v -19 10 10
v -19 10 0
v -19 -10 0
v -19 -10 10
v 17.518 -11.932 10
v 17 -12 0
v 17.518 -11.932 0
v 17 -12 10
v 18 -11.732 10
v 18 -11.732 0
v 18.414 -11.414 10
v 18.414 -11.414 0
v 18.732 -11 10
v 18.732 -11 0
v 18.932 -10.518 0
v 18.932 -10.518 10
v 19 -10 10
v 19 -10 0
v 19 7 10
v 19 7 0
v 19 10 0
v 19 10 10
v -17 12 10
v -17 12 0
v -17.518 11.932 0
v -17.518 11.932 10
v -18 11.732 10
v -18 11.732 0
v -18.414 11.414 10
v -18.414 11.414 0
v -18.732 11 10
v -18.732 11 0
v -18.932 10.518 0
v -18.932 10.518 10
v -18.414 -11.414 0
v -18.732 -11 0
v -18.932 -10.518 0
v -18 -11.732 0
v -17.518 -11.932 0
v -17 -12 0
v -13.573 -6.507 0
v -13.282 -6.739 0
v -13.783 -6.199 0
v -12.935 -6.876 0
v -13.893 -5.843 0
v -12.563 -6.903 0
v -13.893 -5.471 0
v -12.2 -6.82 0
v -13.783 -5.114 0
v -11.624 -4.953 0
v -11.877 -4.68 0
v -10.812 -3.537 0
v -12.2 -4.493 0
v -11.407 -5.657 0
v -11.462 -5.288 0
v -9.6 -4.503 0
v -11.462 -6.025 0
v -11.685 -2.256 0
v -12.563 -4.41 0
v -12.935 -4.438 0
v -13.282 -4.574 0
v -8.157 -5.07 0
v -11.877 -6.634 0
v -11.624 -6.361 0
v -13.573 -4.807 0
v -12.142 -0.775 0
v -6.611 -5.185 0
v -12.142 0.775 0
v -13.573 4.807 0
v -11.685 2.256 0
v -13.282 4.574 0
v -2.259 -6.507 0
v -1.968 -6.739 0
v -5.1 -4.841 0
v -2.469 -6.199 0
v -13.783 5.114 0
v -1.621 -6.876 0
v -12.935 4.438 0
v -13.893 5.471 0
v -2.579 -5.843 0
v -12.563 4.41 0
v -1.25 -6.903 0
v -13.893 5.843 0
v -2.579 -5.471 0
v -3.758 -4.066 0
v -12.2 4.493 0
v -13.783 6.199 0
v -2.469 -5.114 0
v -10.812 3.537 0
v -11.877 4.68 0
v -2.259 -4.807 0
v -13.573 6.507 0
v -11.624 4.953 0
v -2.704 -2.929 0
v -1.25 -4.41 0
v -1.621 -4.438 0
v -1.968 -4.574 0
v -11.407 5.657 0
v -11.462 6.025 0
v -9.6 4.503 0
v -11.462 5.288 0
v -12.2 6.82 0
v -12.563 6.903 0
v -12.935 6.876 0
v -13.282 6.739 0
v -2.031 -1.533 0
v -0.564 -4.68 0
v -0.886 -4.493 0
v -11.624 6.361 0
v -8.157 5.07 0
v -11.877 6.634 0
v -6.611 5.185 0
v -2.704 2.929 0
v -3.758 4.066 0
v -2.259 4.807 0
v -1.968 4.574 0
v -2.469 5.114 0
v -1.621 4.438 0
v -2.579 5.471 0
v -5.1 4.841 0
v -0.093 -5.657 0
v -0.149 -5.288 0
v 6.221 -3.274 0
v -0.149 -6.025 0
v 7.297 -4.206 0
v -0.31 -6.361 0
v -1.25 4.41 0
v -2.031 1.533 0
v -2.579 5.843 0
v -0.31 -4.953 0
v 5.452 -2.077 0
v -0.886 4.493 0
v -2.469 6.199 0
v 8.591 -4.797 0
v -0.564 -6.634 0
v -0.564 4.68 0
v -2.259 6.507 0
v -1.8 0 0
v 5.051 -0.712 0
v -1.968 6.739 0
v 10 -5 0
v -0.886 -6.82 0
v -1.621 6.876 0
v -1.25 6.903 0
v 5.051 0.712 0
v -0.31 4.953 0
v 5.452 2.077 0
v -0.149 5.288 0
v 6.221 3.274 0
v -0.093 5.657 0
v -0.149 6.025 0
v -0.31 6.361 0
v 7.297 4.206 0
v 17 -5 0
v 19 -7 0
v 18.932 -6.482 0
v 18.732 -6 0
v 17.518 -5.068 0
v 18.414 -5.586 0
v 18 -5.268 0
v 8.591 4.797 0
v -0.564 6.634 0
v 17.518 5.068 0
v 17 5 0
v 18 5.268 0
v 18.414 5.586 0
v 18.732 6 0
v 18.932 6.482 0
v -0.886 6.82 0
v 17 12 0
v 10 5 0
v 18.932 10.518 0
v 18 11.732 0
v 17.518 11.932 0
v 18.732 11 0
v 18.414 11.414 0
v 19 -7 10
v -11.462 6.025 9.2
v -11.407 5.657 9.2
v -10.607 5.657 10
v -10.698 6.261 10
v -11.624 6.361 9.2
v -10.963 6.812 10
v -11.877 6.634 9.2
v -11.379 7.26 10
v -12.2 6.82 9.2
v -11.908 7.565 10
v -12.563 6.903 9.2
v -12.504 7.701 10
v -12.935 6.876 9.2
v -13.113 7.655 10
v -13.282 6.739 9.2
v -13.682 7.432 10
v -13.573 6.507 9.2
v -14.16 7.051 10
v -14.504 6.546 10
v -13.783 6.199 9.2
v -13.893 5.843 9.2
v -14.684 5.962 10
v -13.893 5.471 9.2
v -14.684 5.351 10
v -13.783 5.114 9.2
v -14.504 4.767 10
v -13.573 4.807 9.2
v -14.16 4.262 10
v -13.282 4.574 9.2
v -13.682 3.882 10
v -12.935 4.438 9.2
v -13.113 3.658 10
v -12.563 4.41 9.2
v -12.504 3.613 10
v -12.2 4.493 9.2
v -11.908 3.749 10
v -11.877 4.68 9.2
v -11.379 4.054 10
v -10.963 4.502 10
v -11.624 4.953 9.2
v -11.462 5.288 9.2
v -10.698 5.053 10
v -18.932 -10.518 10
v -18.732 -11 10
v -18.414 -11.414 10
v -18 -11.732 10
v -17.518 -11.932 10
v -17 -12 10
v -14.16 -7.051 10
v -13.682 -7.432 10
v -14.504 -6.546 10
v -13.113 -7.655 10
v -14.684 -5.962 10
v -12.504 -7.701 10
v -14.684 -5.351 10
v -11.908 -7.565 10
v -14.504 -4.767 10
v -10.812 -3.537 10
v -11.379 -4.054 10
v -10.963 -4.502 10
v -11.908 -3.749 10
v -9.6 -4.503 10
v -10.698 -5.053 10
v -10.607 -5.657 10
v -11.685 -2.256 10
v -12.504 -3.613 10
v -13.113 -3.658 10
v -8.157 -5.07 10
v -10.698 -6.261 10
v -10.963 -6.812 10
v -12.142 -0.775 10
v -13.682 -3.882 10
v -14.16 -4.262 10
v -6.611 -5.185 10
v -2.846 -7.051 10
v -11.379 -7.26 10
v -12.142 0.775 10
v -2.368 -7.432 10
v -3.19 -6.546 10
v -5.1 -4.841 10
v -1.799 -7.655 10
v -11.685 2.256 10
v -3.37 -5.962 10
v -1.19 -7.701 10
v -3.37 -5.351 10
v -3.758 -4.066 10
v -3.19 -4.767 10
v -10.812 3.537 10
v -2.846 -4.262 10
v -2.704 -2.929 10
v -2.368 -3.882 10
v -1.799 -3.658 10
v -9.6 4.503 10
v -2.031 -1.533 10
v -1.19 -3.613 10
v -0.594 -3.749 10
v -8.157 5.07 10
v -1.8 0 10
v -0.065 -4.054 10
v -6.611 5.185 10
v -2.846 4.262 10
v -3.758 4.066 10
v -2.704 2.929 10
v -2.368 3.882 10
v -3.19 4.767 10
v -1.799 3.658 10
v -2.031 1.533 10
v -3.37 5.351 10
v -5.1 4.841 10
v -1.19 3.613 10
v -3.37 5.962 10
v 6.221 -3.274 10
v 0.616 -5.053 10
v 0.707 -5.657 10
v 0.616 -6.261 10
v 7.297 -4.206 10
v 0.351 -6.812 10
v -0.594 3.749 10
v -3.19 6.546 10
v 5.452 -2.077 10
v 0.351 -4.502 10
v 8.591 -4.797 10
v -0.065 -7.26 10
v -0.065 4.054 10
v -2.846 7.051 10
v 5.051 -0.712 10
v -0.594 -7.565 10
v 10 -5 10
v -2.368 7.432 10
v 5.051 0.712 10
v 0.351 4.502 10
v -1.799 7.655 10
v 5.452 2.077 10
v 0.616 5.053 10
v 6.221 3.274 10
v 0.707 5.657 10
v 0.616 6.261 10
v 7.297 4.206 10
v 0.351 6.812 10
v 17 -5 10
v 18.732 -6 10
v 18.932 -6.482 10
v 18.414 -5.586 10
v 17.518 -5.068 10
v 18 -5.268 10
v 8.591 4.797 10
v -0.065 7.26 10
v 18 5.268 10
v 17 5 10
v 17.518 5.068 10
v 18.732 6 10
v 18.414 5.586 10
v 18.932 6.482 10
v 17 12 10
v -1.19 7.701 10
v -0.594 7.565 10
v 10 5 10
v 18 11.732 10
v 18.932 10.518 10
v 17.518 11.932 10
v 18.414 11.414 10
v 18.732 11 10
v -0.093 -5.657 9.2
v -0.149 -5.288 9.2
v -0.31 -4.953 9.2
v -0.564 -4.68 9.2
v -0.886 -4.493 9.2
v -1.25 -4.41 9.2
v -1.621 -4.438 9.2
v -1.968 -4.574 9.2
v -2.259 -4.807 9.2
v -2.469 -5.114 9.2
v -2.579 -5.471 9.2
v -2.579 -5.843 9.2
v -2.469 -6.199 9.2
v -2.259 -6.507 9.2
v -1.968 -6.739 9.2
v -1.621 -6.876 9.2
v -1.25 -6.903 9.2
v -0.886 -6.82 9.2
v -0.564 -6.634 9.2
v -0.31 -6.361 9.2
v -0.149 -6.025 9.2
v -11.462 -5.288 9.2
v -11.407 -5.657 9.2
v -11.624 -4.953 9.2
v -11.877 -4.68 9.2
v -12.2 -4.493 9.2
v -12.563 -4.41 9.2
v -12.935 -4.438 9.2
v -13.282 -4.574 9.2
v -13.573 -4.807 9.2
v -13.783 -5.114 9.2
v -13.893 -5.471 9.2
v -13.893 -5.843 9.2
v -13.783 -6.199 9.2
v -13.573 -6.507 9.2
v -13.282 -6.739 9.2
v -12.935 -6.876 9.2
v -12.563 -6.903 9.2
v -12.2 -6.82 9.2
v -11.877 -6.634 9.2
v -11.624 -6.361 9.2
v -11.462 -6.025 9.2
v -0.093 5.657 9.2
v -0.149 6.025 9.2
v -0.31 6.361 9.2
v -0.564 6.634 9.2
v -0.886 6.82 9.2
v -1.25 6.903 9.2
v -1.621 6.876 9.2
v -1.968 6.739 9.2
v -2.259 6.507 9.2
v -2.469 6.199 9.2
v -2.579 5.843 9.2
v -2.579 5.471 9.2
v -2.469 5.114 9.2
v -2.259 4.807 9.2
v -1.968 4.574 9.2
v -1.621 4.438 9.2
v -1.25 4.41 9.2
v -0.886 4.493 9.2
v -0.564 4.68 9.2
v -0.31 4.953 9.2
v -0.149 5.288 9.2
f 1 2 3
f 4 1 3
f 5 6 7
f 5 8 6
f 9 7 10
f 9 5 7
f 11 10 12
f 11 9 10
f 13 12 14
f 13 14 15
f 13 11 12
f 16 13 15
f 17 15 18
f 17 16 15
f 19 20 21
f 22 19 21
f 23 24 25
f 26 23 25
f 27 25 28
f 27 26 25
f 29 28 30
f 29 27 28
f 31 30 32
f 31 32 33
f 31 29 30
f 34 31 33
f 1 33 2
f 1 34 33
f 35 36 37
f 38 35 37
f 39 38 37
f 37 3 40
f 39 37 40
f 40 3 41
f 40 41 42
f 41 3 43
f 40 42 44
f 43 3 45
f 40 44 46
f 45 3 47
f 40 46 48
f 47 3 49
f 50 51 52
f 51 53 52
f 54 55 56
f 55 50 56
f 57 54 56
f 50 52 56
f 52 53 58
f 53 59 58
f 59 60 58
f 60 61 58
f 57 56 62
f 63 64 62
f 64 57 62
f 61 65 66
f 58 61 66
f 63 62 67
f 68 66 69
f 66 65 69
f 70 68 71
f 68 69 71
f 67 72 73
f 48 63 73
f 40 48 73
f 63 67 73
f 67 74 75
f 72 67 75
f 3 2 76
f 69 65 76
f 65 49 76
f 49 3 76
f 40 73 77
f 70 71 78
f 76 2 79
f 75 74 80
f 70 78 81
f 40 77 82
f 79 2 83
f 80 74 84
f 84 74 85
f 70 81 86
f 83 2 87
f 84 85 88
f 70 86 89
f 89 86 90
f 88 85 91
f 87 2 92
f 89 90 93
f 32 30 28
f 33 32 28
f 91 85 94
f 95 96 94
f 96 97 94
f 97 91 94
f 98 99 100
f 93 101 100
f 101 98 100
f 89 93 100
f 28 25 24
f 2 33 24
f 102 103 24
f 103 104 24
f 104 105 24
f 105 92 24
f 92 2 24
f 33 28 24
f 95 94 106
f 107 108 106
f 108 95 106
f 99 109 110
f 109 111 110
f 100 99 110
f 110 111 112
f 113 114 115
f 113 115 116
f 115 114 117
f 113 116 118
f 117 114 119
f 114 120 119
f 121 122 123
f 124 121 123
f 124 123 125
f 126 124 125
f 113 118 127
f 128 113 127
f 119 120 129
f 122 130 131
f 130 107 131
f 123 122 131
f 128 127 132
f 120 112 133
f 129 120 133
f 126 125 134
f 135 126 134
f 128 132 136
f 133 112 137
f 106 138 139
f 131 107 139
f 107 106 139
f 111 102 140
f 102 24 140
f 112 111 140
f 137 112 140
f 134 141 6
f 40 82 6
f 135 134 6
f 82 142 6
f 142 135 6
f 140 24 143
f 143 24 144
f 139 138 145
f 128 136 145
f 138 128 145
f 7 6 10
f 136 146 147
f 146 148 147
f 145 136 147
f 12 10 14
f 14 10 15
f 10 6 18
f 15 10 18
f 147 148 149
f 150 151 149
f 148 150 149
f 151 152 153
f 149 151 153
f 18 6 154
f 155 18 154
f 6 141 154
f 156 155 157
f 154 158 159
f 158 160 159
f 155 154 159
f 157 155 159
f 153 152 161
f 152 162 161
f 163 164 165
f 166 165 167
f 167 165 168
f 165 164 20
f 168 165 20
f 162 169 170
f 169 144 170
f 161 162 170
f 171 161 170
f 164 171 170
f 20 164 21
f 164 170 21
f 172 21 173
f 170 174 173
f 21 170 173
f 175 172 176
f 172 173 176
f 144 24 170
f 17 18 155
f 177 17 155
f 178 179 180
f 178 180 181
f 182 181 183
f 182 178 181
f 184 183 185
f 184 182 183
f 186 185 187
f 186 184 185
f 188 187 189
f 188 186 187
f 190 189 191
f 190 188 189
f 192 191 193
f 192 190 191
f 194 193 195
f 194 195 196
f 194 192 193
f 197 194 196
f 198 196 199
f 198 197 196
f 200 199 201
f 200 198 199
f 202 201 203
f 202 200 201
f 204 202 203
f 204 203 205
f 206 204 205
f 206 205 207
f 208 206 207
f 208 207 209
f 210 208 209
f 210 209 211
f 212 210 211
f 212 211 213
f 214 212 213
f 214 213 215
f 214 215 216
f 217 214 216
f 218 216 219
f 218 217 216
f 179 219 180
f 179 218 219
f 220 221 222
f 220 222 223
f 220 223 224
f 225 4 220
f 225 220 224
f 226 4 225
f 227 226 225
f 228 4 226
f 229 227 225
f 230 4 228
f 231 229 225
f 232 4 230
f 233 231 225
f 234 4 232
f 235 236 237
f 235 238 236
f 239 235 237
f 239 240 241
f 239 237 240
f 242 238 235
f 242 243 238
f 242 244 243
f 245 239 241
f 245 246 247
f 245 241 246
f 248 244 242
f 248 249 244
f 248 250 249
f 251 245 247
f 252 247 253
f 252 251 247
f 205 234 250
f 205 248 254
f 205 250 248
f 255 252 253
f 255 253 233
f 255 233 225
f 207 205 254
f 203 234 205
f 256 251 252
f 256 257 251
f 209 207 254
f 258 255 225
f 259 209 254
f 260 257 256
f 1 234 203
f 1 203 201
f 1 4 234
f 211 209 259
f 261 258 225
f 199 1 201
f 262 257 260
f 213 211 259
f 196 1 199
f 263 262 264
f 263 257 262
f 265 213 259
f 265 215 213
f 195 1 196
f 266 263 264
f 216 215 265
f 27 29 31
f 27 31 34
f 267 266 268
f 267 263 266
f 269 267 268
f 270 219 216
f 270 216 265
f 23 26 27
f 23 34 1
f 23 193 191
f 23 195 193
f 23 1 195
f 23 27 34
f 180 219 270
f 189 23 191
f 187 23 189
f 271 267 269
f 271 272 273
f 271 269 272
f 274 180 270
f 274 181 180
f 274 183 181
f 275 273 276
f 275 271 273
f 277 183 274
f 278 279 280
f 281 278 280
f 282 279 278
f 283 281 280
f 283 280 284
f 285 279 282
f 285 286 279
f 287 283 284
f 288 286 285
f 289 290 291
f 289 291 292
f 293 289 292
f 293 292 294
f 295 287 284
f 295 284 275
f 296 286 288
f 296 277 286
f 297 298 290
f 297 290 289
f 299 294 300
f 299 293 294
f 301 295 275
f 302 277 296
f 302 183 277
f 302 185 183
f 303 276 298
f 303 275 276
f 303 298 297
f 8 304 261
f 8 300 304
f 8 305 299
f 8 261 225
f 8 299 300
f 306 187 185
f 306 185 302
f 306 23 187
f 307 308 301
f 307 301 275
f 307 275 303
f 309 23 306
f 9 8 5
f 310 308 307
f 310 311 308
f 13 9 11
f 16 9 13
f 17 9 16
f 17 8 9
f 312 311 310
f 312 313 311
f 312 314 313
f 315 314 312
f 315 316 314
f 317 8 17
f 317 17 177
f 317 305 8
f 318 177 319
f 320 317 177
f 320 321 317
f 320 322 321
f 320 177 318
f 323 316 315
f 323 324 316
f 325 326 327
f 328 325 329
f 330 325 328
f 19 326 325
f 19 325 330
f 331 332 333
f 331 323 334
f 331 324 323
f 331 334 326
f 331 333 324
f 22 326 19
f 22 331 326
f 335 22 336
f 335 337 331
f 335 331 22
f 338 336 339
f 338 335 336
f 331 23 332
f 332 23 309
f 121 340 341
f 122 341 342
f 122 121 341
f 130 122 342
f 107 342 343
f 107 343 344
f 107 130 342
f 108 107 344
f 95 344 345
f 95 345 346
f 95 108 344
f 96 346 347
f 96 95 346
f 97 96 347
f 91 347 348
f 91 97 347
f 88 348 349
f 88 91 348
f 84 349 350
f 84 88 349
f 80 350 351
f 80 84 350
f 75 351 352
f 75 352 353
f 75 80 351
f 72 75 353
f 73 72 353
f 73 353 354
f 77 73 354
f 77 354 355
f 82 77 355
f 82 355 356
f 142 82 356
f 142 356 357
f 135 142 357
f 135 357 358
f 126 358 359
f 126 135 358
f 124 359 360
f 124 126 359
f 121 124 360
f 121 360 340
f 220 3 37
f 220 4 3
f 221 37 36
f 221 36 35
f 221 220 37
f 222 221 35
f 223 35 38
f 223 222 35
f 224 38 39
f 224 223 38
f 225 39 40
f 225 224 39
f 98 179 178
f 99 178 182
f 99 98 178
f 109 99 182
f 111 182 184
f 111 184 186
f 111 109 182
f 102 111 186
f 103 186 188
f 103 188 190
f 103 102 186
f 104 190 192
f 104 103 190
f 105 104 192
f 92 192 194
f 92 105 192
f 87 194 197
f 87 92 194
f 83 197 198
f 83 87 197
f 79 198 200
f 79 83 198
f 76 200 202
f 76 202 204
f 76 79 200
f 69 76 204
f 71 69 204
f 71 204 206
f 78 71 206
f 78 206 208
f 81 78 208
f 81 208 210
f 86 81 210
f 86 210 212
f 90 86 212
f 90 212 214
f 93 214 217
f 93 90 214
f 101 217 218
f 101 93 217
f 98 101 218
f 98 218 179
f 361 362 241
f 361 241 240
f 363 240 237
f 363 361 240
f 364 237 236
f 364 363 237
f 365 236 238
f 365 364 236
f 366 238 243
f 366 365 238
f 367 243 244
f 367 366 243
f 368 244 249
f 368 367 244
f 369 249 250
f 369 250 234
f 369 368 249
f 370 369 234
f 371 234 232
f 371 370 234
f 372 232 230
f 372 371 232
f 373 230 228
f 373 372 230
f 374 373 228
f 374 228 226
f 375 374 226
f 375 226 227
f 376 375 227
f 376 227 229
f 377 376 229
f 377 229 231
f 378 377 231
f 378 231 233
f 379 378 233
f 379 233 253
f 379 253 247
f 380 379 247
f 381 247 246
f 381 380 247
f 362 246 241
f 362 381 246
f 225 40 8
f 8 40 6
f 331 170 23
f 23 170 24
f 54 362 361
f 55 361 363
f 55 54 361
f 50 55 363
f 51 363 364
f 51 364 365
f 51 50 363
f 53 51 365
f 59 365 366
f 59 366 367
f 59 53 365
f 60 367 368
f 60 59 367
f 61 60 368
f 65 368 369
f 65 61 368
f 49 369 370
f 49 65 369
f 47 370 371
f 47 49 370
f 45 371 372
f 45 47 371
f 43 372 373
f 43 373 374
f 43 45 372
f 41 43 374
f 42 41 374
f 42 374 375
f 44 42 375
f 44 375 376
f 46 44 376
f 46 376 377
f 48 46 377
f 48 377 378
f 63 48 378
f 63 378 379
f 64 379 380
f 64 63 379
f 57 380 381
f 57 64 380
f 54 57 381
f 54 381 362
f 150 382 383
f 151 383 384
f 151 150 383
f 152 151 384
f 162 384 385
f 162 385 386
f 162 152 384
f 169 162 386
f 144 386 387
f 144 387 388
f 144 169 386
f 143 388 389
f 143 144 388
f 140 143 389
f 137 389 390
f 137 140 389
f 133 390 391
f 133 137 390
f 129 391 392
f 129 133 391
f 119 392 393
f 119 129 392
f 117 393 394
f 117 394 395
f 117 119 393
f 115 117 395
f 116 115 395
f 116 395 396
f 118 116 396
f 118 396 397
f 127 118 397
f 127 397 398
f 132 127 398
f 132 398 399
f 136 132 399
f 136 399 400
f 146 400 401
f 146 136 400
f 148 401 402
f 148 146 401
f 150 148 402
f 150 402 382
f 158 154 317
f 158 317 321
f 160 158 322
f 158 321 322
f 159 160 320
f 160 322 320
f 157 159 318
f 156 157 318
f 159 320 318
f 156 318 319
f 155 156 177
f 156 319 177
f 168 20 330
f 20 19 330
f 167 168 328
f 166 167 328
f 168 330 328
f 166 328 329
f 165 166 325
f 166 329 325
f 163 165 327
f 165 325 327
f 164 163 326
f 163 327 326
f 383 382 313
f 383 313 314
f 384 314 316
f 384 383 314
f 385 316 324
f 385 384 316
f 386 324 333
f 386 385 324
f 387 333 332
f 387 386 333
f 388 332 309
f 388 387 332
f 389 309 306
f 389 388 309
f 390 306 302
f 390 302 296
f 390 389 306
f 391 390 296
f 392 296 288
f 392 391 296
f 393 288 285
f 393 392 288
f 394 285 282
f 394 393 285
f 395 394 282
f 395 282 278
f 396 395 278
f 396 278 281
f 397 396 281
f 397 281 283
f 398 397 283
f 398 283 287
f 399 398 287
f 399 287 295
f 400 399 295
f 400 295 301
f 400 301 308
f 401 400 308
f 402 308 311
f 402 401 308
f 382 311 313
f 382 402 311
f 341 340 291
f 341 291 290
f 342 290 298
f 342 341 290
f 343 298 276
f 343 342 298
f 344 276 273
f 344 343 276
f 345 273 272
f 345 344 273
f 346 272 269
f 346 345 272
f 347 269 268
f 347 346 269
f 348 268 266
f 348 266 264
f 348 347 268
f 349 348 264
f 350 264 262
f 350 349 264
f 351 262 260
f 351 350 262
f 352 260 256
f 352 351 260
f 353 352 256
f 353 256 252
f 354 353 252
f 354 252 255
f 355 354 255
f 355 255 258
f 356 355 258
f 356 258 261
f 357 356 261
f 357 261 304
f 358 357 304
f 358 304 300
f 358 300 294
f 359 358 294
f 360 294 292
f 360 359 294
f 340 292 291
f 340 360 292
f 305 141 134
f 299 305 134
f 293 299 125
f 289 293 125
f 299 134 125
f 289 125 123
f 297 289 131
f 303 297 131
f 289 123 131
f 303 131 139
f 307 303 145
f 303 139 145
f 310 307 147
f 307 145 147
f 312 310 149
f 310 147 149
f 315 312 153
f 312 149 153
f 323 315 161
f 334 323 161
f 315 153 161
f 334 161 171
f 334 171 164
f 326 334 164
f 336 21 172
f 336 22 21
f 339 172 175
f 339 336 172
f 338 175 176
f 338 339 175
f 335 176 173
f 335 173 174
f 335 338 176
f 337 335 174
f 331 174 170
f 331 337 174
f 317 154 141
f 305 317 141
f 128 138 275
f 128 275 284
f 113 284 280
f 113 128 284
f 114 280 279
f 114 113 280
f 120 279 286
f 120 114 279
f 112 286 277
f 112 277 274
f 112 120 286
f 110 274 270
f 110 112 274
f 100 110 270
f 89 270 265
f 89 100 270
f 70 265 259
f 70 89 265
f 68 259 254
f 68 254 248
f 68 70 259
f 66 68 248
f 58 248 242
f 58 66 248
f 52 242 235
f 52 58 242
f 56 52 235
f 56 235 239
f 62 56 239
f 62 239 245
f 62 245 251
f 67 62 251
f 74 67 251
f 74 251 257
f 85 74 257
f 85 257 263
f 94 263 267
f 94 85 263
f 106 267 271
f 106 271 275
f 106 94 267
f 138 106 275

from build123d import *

# Parameters (mm, degrees)
F0_R     = 1.25
F0_R_2   = 5.2
F1_DEPTH = 10
F2_R     = 2
F3_SIZE  = 0.8


with BuildPart() as f1:
    # F0 (on Top) → F1 (new body)
    with BuildSketch(Plane.XY):
        with BuildLine():
            Line((19, 5), (19, 12))
            Line((19, 12), (-19, 12))
            Line((-19, 12), (-19, -12))
            Line((-19, -12), (19, -12))
            Line((19, -12), (19, -5))
            Line((19, -5), (10, -5))
            ThreePointArc((10, -5), (5, 0), (10, 5))
            Line((10, 5), (19, 5))
        make_face()
        with Locations((-12.656854, -5.656854)):
            Circle(F0_R, mode=Mode.SUBTRACT)
        with Locations((-1.343146, -5.656854)):
            Circle(F0_R, mode=Mode.SUBTRACT)
        with Locations((-12.656854, 5.656854)):
            Circle(F0_R, mode=Mode.SUBTRACT)
        with Locations((-7, 0)):
            Circle(F0_R_2, mode=Mode.SUBTRACT)
        with Locations((-1.343146, 5.656854)):
            Circle(F0_R, mode=Mode.SUBTRACT)
    extrude(amount=F1_DEPTH)

    # F2
    f2_edges = [f1.edges().sort_by_distance(p)[0] for p in [
        (-19, -12, 5),
        (-19, 12, 5),
        (19, -12, 5),
        (19, -5, 5),
        (19, 5, 5),
        (19, 12, 5),
    ]]
    fillet(f2_edges, radius=F2_R)

    # F3
    f3_edges = [f1.edges().sort_by_distance(p)[0] for p in [
        (-13.906854, 5.656854, 10),
        (-2.593146, 5.656854, 10),
        (-2.593146, -5.656854, 10),
        (-13.906854, -5.656854, 10),
    ]]
    chamfer(f3_edges, length=F3_SIZE)


solid = f1.part
